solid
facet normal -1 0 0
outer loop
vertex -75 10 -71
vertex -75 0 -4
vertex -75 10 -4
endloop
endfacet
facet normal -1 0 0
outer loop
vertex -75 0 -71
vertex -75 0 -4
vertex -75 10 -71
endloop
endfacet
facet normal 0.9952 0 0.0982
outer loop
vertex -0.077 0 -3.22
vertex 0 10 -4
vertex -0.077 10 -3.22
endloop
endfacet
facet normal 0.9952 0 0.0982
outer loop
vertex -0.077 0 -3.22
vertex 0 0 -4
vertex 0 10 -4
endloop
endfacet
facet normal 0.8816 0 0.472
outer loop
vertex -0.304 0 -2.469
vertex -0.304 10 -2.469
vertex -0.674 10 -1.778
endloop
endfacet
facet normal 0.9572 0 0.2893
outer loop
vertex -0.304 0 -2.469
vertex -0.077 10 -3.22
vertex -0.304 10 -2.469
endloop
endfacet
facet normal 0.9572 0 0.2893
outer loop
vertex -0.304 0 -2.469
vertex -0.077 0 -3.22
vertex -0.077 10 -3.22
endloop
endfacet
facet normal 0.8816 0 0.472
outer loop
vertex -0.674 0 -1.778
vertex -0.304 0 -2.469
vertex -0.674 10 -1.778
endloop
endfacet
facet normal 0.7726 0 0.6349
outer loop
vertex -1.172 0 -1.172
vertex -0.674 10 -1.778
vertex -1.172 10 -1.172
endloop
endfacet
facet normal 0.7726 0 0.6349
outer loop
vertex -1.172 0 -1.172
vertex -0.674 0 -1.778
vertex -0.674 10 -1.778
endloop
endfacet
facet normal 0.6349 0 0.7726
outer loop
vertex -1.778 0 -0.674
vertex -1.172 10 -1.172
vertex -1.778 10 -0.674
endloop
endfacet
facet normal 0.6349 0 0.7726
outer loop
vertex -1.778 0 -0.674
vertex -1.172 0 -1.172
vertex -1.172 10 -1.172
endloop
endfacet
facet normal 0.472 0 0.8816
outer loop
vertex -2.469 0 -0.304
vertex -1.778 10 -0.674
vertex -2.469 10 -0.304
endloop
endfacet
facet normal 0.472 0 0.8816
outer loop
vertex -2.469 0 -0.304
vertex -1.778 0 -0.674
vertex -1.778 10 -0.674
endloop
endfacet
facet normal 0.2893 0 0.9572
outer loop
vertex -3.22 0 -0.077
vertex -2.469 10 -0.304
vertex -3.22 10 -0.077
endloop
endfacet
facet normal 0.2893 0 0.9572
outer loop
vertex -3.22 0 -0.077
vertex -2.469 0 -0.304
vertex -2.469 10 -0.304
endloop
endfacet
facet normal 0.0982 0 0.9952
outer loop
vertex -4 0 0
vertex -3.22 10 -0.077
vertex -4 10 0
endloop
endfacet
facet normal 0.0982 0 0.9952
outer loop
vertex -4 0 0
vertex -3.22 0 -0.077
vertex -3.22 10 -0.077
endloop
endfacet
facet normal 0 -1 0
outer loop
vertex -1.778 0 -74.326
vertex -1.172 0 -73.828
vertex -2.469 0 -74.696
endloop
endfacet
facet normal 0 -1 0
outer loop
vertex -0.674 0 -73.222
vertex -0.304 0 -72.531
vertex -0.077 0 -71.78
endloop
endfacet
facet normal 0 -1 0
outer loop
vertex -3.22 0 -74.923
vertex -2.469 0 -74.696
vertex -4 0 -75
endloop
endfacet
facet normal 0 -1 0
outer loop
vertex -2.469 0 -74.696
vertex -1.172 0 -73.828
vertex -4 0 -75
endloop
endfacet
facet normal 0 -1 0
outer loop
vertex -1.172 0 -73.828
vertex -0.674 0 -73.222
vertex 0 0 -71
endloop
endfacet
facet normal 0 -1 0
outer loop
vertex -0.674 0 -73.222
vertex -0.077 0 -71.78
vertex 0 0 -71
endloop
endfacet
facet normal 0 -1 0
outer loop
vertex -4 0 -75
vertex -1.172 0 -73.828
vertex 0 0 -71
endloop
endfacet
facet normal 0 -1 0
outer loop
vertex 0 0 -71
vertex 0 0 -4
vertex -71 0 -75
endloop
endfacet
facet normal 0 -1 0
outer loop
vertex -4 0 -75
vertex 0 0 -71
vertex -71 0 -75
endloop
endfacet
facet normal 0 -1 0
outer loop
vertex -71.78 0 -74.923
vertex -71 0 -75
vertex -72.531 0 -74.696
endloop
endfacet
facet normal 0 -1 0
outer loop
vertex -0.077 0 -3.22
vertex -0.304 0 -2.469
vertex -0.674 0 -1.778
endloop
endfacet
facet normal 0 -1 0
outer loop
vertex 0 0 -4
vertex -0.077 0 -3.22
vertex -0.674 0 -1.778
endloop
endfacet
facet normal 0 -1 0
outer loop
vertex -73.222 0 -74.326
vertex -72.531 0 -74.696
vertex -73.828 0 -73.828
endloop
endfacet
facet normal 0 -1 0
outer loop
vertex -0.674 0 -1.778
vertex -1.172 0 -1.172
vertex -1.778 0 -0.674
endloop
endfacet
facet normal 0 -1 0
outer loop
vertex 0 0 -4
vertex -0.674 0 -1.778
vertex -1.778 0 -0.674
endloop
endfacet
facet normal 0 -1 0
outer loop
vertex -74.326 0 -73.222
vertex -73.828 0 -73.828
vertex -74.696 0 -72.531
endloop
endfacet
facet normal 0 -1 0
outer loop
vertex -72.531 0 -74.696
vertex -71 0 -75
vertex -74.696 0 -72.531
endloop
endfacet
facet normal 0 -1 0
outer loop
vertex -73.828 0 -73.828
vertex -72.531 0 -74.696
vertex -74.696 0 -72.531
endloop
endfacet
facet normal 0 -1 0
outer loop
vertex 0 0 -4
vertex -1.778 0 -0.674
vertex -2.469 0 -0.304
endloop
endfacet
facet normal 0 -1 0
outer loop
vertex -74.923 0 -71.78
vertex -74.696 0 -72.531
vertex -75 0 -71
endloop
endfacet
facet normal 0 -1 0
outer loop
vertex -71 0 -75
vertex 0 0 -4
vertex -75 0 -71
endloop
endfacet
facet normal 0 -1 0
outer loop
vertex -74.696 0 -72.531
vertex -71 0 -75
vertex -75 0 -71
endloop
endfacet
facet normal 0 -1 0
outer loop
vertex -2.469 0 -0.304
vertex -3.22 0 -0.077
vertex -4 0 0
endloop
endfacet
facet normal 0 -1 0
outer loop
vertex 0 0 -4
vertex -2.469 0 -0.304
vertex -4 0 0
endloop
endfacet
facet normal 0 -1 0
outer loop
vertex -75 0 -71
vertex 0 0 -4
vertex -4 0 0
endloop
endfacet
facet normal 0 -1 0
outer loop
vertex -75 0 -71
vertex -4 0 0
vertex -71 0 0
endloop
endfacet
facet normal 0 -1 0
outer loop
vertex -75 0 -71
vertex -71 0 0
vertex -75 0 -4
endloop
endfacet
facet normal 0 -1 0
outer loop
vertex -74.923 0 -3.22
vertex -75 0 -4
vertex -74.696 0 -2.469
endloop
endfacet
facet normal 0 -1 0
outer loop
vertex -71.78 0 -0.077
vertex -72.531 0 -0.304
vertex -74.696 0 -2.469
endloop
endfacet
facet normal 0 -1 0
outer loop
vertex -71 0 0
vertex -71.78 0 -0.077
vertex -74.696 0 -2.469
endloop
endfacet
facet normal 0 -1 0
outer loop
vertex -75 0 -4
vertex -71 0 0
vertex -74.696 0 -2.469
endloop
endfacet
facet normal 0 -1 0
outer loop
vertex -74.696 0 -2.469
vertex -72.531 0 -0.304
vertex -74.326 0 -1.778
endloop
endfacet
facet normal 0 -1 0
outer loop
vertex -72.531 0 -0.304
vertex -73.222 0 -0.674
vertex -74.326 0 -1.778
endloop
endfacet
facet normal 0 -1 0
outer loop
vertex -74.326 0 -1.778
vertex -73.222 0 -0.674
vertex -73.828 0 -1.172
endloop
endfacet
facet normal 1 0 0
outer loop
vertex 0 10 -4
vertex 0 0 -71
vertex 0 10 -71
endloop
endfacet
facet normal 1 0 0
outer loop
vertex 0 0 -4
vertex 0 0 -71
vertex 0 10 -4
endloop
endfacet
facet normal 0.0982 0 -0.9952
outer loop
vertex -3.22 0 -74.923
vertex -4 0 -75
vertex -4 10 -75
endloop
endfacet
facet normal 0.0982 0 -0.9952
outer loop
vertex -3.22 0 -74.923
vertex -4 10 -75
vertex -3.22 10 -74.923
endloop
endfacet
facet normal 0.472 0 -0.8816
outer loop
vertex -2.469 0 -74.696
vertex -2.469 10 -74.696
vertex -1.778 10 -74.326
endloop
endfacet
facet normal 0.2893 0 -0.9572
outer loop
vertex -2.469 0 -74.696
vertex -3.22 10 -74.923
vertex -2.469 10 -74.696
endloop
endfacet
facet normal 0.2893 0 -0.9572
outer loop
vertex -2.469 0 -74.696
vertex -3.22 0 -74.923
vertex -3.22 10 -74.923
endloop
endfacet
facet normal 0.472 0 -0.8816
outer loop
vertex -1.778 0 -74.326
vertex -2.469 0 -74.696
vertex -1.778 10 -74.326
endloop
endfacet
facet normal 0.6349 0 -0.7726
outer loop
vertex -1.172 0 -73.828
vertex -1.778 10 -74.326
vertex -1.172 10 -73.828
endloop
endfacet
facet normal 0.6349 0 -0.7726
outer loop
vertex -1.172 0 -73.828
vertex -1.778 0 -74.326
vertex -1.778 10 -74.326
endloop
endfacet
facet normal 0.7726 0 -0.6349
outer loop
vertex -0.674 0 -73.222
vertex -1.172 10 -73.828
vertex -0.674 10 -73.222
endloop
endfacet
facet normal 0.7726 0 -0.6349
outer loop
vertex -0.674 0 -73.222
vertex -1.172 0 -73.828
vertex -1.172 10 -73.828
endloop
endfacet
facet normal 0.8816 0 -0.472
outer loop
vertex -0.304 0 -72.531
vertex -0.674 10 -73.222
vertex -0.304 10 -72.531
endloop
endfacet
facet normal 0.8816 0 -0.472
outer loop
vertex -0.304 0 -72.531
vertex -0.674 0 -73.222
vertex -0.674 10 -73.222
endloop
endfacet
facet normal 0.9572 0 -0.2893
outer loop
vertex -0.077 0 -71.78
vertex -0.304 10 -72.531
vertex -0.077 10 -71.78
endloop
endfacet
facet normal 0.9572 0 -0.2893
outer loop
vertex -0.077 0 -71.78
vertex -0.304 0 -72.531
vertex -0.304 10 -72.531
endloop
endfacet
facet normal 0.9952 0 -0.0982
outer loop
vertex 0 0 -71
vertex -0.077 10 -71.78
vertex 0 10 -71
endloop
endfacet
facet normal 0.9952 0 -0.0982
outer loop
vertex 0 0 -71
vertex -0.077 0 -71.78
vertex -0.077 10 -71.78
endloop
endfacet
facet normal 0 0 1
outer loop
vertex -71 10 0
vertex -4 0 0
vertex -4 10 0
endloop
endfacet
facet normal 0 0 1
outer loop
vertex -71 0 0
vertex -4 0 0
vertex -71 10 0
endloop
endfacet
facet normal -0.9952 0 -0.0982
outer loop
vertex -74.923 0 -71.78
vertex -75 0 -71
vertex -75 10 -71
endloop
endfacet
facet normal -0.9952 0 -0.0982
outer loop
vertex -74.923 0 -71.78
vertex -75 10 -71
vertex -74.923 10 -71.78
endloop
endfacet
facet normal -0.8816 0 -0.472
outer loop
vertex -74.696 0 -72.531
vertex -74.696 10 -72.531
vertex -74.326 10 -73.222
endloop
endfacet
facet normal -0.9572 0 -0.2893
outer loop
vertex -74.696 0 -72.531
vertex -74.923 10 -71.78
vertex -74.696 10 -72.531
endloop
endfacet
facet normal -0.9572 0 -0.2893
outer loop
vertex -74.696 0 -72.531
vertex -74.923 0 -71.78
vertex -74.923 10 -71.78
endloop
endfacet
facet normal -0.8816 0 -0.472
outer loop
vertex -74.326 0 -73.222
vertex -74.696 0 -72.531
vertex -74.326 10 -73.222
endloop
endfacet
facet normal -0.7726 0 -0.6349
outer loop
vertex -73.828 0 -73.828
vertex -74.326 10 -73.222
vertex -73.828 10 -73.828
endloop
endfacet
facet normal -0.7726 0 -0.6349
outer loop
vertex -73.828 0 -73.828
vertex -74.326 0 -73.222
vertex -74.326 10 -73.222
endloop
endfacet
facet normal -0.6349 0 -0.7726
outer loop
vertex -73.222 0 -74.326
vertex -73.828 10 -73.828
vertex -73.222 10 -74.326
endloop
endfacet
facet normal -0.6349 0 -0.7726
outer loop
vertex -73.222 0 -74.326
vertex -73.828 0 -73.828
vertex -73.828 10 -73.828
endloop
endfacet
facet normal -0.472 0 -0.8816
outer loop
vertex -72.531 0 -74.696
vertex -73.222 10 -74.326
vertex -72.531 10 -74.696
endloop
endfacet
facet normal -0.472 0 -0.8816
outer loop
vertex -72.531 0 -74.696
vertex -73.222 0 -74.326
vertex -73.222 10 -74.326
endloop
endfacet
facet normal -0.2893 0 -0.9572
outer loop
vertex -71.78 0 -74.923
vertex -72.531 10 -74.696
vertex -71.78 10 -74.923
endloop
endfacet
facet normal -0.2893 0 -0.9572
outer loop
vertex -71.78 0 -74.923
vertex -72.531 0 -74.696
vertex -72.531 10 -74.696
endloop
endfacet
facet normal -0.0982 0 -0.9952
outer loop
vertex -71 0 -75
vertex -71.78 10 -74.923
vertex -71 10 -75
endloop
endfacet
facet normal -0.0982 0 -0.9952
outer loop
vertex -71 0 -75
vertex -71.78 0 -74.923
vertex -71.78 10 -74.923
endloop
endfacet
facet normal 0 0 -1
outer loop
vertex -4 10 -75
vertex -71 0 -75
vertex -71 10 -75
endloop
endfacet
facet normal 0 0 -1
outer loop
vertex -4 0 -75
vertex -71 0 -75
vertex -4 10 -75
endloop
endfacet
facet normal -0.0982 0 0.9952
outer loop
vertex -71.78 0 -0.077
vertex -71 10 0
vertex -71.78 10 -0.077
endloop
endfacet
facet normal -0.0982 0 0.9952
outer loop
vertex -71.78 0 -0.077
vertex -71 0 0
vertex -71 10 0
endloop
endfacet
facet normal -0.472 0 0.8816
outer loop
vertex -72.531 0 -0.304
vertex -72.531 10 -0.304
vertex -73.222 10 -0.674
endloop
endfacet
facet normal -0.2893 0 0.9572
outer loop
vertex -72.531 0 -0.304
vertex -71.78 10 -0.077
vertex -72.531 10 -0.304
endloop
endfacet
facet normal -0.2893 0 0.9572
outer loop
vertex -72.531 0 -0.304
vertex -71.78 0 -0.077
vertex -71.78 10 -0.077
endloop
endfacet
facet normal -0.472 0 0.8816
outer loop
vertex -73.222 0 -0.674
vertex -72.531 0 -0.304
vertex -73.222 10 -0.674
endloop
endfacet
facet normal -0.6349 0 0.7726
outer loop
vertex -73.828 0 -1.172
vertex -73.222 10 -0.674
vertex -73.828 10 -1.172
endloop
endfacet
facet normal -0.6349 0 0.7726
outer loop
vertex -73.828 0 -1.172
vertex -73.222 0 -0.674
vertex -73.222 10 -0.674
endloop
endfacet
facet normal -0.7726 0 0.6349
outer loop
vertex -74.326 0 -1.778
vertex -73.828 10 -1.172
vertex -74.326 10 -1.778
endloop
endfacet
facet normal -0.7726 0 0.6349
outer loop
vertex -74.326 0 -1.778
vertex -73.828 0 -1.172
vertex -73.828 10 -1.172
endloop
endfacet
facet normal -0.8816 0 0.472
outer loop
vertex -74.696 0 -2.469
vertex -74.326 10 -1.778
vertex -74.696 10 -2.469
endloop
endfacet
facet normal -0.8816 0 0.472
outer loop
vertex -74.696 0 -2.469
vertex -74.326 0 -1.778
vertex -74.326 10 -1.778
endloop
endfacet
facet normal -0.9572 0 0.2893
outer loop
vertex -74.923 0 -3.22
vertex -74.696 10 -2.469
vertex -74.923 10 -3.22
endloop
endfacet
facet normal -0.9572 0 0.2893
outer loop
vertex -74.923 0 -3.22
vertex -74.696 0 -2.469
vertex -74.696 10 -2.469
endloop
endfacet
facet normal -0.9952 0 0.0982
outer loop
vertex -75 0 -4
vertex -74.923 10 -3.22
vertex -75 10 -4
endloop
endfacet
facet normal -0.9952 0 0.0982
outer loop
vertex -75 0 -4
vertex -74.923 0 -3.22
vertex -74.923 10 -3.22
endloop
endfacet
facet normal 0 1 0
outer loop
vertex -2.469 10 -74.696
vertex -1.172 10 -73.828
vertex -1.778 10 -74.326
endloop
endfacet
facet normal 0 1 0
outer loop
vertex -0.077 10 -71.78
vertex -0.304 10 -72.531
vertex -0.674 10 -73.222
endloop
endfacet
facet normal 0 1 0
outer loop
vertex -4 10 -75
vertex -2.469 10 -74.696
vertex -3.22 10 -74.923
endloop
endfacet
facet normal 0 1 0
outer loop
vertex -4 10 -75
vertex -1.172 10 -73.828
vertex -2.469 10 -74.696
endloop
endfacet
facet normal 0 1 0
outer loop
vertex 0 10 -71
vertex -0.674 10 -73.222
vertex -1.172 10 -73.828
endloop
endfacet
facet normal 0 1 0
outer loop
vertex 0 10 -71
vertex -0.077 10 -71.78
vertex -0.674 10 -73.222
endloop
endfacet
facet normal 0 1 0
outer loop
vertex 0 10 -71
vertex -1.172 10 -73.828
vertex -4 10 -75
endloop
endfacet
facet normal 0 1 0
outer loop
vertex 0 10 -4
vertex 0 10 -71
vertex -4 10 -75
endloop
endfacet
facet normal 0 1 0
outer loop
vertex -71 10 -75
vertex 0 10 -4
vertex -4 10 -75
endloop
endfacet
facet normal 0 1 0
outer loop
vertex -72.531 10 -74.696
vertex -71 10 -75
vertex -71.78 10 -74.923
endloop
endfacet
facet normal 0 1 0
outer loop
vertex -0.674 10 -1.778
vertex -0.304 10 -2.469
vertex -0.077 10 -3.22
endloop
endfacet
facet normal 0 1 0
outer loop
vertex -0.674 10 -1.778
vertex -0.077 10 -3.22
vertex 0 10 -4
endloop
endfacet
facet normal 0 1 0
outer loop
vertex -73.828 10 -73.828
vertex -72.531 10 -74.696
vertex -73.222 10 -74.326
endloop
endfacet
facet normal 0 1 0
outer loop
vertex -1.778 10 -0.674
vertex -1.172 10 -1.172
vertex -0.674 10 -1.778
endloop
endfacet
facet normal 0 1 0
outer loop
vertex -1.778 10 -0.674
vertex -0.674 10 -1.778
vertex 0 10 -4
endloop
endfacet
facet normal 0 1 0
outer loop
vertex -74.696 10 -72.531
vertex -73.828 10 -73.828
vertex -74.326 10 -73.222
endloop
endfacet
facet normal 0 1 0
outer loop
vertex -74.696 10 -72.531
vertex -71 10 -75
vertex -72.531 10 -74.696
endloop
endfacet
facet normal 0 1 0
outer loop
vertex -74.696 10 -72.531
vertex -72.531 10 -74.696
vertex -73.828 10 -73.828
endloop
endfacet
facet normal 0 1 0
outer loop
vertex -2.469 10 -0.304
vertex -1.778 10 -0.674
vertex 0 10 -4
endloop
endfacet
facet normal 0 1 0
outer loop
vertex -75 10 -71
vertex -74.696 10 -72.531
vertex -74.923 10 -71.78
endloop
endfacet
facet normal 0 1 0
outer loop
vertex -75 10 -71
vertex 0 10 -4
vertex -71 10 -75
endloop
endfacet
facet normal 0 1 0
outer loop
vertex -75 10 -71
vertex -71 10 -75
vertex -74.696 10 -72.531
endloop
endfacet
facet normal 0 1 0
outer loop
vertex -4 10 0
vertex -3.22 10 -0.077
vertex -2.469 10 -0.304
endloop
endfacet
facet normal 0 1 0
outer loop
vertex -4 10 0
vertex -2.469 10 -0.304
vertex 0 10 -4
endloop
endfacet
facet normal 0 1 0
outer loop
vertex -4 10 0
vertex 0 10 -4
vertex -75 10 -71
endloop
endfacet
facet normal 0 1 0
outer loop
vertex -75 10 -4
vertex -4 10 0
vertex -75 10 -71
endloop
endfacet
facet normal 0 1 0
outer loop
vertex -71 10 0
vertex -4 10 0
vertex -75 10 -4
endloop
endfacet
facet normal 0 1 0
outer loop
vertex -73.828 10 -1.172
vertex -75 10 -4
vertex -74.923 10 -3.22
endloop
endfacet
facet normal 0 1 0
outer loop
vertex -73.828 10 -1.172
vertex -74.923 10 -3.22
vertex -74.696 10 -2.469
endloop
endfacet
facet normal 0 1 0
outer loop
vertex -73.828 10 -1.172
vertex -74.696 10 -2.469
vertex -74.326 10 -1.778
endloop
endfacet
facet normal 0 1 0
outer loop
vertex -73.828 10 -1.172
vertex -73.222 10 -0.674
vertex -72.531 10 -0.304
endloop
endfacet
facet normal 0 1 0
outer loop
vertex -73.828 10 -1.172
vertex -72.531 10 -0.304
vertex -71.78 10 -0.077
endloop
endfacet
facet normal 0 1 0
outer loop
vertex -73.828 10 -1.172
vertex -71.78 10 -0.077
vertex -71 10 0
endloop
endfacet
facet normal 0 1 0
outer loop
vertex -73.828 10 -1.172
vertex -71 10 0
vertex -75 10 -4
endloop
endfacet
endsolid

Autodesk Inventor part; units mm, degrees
ref_plane "YZ Plane" through (0, 0, 0) normal (1, 0, 0) x (0, 1, 0)
ref_plane "XZ Plane" through (0, 0, 0) normal (0, 1, 0) x (-1, 0, 0)
ref_plane "XY Plane" through (0, 0, 0) normal (0, 0, 1) x (1, 0, 0)
sketch "Boceto1" plane through (0, 0, 0) normal (0, 1, 0) x (-1, 0, 0)
  line L0 (4, 0) -> (71, 0)
  line L1 (75, -4) -> (75, -71)
  line L2 (71, -75) -> (4, -75)
  line L3 (0, -71) -> (0, -4)
  arc A0 (75, -4) -> (71, 0) centre (71, -4) ccw
  arc A1 (71, -75) -> (75, -71) centre (71, -71) ccw
  arc A2 (0, -71) -> (4, -75) centre (4, -71) ccw
  arc A3 (4, 0) -> (0, -4) centre (4, -4) ccw
  point P0 (0, 0)
  point P1 (75, 0)
  dimension "d0" = 75
  dimension "d1" = 4
extrude "Extrusión1" add sketch "Boceto1" along normal blind 10
properties part number "Marco - Asiento Triciclo" material "Aluminio 6061"
